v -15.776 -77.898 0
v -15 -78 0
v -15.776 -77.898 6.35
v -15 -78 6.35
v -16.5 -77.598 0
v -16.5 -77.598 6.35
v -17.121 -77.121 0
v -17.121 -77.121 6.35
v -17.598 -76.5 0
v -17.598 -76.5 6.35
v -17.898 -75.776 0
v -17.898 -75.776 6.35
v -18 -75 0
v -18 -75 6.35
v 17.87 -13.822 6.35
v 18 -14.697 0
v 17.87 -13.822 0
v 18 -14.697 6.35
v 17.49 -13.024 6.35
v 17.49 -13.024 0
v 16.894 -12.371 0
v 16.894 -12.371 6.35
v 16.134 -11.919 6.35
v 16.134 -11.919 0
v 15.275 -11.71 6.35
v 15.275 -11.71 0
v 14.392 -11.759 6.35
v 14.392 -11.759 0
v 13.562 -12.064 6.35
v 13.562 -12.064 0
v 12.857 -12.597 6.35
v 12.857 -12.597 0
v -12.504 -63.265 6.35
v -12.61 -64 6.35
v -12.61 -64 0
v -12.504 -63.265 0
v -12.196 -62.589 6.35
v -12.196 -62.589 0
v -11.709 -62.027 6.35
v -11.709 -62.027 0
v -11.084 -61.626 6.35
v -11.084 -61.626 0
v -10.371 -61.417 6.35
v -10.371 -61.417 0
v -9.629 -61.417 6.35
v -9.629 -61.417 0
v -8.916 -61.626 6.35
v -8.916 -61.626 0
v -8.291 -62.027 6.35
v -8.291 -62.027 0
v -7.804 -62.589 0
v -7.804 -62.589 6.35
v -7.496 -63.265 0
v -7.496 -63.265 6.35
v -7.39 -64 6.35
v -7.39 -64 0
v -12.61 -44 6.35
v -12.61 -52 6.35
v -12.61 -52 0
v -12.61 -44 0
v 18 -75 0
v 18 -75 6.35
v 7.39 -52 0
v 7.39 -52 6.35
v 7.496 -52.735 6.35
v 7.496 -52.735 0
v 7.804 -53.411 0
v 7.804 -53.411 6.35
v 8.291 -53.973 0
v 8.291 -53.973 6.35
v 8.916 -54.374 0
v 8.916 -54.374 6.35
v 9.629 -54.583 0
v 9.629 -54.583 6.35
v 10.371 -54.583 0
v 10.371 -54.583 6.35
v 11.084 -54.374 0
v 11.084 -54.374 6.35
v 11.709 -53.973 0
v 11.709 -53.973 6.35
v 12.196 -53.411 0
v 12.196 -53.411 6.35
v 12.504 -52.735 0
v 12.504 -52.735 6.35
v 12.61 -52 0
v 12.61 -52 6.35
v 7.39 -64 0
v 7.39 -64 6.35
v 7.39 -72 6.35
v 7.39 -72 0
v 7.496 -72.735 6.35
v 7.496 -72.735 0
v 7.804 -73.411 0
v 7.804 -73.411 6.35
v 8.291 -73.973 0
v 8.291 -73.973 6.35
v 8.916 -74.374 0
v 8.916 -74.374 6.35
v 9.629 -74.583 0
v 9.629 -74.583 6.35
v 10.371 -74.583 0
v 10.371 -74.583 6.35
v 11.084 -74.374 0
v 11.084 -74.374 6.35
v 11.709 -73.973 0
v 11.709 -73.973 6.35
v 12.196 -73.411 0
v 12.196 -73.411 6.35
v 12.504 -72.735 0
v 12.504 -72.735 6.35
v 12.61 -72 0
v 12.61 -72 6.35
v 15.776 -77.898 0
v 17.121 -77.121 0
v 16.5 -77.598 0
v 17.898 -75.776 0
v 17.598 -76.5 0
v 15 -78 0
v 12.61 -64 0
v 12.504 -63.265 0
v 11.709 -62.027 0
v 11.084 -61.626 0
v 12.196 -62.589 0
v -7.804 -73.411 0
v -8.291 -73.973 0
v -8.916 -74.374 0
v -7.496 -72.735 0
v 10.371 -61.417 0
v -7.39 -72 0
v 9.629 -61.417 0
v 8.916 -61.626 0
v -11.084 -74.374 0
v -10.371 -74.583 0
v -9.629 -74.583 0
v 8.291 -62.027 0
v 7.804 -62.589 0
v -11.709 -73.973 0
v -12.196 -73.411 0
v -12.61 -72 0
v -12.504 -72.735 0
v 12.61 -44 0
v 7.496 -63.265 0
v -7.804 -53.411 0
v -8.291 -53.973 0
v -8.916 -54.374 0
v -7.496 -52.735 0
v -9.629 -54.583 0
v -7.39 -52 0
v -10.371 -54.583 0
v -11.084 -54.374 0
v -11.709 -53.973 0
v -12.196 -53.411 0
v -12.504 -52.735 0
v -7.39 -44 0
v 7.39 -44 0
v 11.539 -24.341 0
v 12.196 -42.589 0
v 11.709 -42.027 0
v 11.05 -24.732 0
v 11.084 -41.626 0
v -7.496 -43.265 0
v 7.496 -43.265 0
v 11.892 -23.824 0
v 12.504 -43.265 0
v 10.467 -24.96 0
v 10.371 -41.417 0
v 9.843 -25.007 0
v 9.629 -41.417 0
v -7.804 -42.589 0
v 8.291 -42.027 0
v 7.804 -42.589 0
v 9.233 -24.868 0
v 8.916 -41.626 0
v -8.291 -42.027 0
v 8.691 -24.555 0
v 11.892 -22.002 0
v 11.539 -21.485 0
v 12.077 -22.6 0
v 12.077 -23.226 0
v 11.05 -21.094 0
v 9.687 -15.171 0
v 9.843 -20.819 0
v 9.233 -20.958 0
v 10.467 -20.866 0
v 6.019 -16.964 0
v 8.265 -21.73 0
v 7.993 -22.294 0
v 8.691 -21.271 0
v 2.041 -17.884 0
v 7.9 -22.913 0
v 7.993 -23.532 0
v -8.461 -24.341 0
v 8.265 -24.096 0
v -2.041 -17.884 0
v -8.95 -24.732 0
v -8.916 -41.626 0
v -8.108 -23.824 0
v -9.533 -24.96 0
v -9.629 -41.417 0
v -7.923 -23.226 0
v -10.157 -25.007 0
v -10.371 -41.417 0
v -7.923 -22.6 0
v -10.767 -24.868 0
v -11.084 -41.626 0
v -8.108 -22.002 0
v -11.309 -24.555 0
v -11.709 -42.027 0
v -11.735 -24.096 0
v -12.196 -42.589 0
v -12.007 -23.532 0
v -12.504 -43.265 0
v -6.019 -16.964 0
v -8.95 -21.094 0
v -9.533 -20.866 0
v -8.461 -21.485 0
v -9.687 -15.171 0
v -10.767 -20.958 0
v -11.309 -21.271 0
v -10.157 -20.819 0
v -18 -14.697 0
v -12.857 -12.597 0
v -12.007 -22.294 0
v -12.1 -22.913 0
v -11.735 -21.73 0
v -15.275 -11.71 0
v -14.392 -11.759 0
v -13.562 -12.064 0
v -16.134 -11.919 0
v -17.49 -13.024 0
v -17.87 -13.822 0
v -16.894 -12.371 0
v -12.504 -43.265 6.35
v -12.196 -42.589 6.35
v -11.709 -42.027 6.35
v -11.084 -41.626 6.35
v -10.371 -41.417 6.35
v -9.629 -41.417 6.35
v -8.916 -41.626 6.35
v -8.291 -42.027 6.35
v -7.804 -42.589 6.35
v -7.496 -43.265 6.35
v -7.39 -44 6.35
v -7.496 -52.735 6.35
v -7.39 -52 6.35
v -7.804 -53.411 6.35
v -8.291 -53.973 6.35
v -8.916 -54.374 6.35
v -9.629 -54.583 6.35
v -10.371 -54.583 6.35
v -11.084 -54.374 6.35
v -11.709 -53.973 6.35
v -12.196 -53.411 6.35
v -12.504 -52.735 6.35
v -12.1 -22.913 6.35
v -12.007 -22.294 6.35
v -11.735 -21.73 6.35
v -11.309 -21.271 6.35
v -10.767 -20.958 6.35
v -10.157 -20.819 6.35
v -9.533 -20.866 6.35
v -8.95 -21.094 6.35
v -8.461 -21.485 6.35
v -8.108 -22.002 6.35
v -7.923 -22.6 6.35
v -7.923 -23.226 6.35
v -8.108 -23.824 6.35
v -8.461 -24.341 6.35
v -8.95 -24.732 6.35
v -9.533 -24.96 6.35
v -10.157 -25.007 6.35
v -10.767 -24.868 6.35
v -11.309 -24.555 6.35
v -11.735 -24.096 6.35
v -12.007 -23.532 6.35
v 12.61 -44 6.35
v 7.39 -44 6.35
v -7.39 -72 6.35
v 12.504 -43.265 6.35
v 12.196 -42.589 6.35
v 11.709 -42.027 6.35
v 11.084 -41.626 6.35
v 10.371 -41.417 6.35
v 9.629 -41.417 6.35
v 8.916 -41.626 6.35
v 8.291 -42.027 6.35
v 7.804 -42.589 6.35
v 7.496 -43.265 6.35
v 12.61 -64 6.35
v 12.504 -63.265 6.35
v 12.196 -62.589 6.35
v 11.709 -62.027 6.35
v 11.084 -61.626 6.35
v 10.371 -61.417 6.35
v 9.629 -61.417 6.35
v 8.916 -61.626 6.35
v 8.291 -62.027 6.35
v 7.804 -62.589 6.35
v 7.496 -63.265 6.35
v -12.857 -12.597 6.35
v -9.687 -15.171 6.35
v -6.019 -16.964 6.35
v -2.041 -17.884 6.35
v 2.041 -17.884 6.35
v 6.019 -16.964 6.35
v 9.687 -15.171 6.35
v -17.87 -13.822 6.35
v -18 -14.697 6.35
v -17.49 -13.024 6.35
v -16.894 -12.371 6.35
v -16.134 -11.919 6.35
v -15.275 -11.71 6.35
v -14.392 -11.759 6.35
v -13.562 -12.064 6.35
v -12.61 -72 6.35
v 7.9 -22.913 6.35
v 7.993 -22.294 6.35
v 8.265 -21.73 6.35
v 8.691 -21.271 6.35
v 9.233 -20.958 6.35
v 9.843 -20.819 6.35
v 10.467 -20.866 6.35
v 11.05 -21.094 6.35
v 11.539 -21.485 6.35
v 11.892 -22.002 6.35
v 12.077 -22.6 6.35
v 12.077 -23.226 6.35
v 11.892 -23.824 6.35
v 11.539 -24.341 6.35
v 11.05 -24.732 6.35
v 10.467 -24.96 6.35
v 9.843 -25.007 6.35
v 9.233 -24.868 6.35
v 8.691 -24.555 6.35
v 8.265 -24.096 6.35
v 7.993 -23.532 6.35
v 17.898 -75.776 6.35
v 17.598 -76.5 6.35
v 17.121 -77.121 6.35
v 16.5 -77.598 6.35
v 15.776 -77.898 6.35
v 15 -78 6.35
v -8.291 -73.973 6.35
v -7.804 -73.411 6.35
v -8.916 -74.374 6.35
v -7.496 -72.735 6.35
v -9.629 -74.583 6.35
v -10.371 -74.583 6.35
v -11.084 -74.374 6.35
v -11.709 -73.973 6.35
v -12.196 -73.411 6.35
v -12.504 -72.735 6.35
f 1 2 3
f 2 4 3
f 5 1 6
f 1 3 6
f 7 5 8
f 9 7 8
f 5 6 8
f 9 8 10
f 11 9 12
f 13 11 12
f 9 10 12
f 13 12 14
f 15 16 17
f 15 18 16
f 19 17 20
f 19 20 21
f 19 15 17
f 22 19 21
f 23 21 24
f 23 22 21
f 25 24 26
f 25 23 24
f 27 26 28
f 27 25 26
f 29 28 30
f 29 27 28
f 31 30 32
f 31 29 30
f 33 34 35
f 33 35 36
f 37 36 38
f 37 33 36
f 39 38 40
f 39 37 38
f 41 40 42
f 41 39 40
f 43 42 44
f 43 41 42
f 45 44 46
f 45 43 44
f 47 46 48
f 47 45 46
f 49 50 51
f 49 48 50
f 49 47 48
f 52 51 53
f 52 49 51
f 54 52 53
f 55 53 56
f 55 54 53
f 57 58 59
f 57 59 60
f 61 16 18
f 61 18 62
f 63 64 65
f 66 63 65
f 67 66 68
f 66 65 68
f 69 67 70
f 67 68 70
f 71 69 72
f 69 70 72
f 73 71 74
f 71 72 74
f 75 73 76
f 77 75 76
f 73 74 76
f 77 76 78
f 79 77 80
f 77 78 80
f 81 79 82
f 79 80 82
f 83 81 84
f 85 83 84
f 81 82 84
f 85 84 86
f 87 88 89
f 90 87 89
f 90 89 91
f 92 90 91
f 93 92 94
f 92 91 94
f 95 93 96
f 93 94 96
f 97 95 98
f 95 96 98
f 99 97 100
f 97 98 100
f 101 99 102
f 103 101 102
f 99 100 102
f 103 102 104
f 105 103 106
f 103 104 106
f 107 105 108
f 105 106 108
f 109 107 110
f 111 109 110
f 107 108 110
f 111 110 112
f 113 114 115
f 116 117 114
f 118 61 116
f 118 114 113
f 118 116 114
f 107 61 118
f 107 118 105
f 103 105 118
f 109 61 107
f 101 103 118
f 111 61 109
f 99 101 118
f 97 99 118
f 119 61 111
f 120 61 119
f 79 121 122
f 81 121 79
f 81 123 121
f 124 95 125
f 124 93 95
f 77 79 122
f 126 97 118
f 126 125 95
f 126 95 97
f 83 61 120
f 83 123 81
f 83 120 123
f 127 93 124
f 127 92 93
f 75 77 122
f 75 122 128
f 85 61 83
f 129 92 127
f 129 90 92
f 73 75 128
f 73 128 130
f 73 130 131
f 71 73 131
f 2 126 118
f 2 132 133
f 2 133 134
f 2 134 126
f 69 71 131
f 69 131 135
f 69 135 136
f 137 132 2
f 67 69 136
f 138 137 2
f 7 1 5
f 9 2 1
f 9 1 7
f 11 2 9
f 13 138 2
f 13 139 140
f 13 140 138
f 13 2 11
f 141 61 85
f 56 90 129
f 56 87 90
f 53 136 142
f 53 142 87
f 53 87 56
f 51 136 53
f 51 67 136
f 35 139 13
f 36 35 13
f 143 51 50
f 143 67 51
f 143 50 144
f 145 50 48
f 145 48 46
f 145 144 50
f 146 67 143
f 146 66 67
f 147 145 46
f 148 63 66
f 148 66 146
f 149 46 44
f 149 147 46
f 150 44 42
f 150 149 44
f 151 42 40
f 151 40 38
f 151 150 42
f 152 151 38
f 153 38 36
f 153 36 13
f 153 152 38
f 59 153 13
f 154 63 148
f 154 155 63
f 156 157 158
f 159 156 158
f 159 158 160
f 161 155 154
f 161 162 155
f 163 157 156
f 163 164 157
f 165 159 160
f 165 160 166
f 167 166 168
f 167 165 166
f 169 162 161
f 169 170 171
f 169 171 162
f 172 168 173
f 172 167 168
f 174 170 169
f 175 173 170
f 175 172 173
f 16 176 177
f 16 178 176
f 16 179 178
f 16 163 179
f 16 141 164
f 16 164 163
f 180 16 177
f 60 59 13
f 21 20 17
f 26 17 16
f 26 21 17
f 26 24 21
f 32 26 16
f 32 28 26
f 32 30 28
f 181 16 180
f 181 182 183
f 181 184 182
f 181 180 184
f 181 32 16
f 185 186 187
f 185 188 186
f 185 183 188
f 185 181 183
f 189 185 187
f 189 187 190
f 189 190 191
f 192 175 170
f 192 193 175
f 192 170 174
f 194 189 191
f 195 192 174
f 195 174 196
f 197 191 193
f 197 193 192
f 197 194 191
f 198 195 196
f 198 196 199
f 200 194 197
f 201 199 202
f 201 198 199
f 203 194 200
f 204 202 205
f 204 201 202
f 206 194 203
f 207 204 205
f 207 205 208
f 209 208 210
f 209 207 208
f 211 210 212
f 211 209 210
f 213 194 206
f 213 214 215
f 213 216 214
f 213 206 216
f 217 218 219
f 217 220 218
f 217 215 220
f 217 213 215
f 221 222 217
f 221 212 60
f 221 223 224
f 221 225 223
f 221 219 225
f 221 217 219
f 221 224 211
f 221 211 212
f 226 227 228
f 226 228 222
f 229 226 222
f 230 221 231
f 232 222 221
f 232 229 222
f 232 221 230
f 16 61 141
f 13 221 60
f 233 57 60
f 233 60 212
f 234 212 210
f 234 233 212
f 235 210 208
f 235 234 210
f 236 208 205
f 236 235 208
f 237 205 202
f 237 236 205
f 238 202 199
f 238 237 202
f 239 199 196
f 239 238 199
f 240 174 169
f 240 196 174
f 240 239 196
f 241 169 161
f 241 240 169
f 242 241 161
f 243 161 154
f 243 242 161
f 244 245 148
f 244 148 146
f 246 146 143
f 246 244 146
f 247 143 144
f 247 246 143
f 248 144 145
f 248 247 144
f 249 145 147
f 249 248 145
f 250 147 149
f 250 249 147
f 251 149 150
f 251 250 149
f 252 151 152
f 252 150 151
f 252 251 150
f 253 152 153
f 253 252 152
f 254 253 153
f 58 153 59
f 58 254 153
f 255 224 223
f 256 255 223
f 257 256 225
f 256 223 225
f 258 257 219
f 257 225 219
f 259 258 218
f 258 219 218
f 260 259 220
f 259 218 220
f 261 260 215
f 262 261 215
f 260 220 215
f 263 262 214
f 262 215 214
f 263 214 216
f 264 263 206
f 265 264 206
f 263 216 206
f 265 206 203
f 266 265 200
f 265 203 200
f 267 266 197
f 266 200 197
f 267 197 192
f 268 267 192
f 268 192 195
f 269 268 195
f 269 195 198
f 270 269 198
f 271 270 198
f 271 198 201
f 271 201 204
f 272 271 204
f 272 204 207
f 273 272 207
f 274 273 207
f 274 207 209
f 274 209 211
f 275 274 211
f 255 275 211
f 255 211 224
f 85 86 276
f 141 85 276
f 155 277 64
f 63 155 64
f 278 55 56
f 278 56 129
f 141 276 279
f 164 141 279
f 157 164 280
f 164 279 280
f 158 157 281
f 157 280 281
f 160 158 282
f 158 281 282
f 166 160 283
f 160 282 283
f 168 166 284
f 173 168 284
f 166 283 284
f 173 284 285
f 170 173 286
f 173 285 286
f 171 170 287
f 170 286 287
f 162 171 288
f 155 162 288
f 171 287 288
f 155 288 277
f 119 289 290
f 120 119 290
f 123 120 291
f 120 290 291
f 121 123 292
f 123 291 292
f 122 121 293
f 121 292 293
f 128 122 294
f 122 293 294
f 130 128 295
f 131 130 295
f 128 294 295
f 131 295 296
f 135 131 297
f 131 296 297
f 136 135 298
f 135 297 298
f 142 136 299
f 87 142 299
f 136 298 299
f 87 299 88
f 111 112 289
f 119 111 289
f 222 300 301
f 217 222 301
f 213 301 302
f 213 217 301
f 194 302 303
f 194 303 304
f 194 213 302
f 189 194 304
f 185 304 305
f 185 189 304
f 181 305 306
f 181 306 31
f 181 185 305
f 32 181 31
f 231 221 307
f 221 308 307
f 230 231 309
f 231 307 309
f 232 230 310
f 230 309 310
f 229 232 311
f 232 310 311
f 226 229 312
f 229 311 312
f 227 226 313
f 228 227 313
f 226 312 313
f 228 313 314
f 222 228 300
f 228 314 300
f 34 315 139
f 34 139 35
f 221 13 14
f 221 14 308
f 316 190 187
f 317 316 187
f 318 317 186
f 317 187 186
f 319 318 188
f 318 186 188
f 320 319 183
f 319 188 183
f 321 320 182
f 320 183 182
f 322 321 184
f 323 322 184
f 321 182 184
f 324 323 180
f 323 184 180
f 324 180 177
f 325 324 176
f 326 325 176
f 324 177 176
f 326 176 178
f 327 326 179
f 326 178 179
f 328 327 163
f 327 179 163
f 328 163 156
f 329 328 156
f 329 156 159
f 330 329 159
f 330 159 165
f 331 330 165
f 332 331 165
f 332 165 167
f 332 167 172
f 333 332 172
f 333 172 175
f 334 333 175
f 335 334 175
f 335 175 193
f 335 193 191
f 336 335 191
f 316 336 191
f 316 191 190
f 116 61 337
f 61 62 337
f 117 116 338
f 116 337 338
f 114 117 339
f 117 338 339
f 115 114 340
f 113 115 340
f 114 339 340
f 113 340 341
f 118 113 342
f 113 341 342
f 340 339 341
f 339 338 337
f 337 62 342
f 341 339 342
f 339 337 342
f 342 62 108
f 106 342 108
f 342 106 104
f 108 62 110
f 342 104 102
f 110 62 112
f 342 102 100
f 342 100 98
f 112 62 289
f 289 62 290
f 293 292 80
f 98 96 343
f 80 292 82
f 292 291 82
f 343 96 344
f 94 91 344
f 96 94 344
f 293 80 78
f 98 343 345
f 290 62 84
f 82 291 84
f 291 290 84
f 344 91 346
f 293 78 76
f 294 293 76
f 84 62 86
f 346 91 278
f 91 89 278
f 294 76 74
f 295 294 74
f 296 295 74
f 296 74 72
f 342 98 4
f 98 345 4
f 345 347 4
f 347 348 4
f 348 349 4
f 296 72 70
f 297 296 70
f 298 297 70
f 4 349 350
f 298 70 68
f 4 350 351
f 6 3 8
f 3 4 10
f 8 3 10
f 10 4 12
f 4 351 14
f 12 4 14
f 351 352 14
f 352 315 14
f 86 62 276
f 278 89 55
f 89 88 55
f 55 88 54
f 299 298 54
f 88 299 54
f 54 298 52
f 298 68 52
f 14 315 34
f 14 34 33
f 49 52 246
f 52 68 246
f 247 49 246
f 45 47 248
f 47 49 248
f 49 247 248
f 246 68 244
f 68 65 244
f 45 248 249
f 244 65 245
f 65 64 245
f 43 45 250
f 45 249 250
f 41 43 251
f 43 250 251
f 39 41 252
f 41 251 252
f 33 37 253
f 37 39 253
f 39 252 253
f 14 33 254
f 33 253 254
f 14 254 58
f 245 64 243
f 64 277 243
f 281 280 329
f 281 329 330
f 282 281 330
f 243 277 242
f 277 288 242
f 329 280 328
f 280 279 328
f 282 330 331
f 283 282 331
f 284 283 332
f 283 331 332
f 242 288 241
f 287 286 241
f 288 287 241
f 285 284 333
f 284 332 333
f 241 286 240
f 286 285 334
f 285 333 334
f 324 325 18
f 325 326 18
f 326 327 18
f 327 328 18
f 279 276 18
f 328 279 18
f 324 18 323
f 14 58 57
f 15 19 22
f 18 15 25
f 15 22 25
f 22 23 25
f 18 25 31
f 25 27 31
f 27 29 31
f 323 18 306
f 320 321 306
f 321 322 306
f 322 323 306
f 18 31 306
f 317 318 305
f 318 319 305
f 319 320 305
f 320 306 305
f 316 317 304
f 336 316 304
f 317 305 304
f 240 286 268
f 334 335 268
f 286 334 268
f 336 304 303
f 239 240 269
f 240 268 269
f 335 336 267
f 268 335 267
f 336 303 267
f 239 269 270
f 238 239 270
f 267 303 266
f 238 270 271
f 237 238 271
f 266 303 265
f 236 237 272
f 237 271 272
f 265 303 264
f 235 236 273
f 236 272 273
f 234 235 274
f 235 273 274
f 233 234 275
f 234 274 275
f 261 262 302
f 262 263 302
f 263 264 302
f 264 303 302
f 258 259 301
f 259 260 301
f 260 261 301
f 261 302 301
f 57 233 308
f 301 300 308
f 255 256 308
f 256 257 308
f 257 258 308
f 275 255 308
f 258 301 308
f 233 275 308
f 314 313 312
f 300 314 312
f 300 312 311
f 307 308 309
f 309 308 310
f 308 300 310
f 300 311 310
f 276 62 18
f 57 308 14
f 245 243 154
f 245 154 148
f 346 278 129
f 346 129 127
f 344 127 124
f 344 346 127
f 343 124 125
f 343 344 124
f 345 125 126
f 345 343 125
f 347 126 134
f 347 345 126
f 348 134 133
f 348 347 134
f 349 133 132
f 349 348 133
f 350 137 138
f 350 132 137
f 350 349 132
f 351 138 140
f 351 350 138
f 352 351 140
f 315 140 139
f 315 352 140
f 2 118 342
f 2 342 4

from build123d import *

# Parameters (mm, degrees)
BOSS_EXTRUDE1_DEPTH         = 6.35
FILLET1_R                   = 3
CUT_EXTRUDE1_REACH          = 82.301
TAP_DRILL_FOR_M5X0_8_TAP1_D = 4.2


with BuildPart() as part:
    # Sketch1 → Boss-Extrude1 (new body)
    with BuildSketch(Plane.XY):
        with BuildLine():
            Line((18, 0), (18, -78))
            Line((18, -78), (-18, -78))
            Line((-18, -78), (-18, 0))
            ThreePointArc((-18, 0), (0, -18), (18, 0))
        make_face()
    extrude(amount=BOSS_EXTRUDE1_DEPTH)

    # Fillet1
    fillet1_edges = [part.edges().sort_by_distance(p)[0] for p in [
        (18, 0, 3.175),
        (18, -78, 3.175),
        (-18, -78, 3.175),
        (-18, 0, 3.175),
    ]]
    fillet(fillet1_edges, radius=FILLET1_R)

    # Sketch2 → Cut-Extrude1 (cut, up to next)
    with BuildSketch(Plane.XY.offset(6.35), mode=Mode.PRIVATE) as cut_extrude1_sk1:
        with BuildLine():
            Line((-12.61, -72), (-12.61, -64))
            ThreePointArc((-12.61, -64), (-10, -61.39), (-7.39, -64))
            Line((-7.39, -64), (-7.39, -72))
            ThreePointArc((-7.39, -72), (-10, -74.61), (-12.61, -72))
        make_face()
    cut_extrude1_tool1 = extrude(cut_extrude1_sk1.sketch, amount=-CUT_EXTRUDE1_REACH, mode=Mode.PRIVATE) & part.part
    # Sketch2 → Cut-Extrude1 (cut, up to next)
    with BuildSketch(Plane.XY.offset(6.35), mode=Mode.PRIVATE) as cut_extrude1_sk2:
        with BuildLine():
            Line((-12.61, -52), (-12.61, -44))
            ThreePointArc((-12.61, -44), (-10, -41.39), (-7.39, -44))
            Line((-7.39, -44), (-7.39, -52))
            ThreePointArc((-7.39, -52), (-10, -54.61), (-12.61, -52))
        make_face()
    cut_extrude1_tool2 = extrude(cut_extrude1_sk2.sketch, amount=-CUT_EXTRUDE1_REACH, mode=Mode.PRIVATE) & part.part
    # Sketch2 → Cut-Extrude1 (cut, up to next)
    with BuildSketch(Plane.XY.offset(6.35), mode=Mode.PRIVATE) as cut_extrude1_sk3:
        with BuildLine():
            Line((12.61, -72), (12.61, -64))
            ThreePointArc((12.61, -64), (10, -61.39), (7.39, -64))
            Line((7.39, -64), (7.39, -72))
            ThreePointArc((7.39, -72), (10, -74.61), (12.61, -72))
        make_face()
    cut_extrude1_tool3 = extrude(cut_extrude1_sk3.sketch, amount=-CUT_EXTRUDE1_REACH, mode=Mode.PRIVATE) & part.part
    # Sketch2 → Cut-Extrude1 (cut, up to next)
    with BuildSketch(Plane.XY.offset(6.35), mode=Mode.PRIVATE) as cut_extrude1_sk4:
        with BuildLine():
            Line((12.61, -52), (12.61, -44))
            ThreePointArc((12.61, -44), (10, -41.39), (7.39, -44))
            Line((7.39, -44), (7.39, -52))
            ThreePointArc((7.39, -52), (10, -54.61), (12.61, -52))
        make_face()
    cut_extrude1_tool4 = extrude(cut_extrude1_sk4.sketch, amount=-CUT_EXTRUDE1_REACH, mode=Mode.PRIVATE) & part.part
    add(cut_extrude1_tool1.solids().sort_by_distance((-10, -68, 6.35))[0], mode=Mode.SUBTRACT)
    add(cut_extrude1_tool2.solids().sort_by_distance((-10, -48, 6.35))[0], mode=Mode.SUBTRACT)
    add(cut_extrude1_tool3.solids().sort_by_distance((10, -68, 6.35))[0], mode=Mode.SUBTRACT)
    add(cut_extrude1_tool4.solids().sort_by_distance((10, -48, 6.35))[0], mode=Mode.SUBTRACT)

    # Tap Drill for M5x0.8 Tap1 (through all)
    with Locations(Plane(origin=(-10, -22.912878475, 6.35), x_dir=(1, 0, 0), z_dir=(0, 0, 1))):
        with Locations((0, 0), (20, 0)):
            Hole(TAP_DRILL_FOR_M5X0_8_TAP1_D / 2)


solid = part.part
